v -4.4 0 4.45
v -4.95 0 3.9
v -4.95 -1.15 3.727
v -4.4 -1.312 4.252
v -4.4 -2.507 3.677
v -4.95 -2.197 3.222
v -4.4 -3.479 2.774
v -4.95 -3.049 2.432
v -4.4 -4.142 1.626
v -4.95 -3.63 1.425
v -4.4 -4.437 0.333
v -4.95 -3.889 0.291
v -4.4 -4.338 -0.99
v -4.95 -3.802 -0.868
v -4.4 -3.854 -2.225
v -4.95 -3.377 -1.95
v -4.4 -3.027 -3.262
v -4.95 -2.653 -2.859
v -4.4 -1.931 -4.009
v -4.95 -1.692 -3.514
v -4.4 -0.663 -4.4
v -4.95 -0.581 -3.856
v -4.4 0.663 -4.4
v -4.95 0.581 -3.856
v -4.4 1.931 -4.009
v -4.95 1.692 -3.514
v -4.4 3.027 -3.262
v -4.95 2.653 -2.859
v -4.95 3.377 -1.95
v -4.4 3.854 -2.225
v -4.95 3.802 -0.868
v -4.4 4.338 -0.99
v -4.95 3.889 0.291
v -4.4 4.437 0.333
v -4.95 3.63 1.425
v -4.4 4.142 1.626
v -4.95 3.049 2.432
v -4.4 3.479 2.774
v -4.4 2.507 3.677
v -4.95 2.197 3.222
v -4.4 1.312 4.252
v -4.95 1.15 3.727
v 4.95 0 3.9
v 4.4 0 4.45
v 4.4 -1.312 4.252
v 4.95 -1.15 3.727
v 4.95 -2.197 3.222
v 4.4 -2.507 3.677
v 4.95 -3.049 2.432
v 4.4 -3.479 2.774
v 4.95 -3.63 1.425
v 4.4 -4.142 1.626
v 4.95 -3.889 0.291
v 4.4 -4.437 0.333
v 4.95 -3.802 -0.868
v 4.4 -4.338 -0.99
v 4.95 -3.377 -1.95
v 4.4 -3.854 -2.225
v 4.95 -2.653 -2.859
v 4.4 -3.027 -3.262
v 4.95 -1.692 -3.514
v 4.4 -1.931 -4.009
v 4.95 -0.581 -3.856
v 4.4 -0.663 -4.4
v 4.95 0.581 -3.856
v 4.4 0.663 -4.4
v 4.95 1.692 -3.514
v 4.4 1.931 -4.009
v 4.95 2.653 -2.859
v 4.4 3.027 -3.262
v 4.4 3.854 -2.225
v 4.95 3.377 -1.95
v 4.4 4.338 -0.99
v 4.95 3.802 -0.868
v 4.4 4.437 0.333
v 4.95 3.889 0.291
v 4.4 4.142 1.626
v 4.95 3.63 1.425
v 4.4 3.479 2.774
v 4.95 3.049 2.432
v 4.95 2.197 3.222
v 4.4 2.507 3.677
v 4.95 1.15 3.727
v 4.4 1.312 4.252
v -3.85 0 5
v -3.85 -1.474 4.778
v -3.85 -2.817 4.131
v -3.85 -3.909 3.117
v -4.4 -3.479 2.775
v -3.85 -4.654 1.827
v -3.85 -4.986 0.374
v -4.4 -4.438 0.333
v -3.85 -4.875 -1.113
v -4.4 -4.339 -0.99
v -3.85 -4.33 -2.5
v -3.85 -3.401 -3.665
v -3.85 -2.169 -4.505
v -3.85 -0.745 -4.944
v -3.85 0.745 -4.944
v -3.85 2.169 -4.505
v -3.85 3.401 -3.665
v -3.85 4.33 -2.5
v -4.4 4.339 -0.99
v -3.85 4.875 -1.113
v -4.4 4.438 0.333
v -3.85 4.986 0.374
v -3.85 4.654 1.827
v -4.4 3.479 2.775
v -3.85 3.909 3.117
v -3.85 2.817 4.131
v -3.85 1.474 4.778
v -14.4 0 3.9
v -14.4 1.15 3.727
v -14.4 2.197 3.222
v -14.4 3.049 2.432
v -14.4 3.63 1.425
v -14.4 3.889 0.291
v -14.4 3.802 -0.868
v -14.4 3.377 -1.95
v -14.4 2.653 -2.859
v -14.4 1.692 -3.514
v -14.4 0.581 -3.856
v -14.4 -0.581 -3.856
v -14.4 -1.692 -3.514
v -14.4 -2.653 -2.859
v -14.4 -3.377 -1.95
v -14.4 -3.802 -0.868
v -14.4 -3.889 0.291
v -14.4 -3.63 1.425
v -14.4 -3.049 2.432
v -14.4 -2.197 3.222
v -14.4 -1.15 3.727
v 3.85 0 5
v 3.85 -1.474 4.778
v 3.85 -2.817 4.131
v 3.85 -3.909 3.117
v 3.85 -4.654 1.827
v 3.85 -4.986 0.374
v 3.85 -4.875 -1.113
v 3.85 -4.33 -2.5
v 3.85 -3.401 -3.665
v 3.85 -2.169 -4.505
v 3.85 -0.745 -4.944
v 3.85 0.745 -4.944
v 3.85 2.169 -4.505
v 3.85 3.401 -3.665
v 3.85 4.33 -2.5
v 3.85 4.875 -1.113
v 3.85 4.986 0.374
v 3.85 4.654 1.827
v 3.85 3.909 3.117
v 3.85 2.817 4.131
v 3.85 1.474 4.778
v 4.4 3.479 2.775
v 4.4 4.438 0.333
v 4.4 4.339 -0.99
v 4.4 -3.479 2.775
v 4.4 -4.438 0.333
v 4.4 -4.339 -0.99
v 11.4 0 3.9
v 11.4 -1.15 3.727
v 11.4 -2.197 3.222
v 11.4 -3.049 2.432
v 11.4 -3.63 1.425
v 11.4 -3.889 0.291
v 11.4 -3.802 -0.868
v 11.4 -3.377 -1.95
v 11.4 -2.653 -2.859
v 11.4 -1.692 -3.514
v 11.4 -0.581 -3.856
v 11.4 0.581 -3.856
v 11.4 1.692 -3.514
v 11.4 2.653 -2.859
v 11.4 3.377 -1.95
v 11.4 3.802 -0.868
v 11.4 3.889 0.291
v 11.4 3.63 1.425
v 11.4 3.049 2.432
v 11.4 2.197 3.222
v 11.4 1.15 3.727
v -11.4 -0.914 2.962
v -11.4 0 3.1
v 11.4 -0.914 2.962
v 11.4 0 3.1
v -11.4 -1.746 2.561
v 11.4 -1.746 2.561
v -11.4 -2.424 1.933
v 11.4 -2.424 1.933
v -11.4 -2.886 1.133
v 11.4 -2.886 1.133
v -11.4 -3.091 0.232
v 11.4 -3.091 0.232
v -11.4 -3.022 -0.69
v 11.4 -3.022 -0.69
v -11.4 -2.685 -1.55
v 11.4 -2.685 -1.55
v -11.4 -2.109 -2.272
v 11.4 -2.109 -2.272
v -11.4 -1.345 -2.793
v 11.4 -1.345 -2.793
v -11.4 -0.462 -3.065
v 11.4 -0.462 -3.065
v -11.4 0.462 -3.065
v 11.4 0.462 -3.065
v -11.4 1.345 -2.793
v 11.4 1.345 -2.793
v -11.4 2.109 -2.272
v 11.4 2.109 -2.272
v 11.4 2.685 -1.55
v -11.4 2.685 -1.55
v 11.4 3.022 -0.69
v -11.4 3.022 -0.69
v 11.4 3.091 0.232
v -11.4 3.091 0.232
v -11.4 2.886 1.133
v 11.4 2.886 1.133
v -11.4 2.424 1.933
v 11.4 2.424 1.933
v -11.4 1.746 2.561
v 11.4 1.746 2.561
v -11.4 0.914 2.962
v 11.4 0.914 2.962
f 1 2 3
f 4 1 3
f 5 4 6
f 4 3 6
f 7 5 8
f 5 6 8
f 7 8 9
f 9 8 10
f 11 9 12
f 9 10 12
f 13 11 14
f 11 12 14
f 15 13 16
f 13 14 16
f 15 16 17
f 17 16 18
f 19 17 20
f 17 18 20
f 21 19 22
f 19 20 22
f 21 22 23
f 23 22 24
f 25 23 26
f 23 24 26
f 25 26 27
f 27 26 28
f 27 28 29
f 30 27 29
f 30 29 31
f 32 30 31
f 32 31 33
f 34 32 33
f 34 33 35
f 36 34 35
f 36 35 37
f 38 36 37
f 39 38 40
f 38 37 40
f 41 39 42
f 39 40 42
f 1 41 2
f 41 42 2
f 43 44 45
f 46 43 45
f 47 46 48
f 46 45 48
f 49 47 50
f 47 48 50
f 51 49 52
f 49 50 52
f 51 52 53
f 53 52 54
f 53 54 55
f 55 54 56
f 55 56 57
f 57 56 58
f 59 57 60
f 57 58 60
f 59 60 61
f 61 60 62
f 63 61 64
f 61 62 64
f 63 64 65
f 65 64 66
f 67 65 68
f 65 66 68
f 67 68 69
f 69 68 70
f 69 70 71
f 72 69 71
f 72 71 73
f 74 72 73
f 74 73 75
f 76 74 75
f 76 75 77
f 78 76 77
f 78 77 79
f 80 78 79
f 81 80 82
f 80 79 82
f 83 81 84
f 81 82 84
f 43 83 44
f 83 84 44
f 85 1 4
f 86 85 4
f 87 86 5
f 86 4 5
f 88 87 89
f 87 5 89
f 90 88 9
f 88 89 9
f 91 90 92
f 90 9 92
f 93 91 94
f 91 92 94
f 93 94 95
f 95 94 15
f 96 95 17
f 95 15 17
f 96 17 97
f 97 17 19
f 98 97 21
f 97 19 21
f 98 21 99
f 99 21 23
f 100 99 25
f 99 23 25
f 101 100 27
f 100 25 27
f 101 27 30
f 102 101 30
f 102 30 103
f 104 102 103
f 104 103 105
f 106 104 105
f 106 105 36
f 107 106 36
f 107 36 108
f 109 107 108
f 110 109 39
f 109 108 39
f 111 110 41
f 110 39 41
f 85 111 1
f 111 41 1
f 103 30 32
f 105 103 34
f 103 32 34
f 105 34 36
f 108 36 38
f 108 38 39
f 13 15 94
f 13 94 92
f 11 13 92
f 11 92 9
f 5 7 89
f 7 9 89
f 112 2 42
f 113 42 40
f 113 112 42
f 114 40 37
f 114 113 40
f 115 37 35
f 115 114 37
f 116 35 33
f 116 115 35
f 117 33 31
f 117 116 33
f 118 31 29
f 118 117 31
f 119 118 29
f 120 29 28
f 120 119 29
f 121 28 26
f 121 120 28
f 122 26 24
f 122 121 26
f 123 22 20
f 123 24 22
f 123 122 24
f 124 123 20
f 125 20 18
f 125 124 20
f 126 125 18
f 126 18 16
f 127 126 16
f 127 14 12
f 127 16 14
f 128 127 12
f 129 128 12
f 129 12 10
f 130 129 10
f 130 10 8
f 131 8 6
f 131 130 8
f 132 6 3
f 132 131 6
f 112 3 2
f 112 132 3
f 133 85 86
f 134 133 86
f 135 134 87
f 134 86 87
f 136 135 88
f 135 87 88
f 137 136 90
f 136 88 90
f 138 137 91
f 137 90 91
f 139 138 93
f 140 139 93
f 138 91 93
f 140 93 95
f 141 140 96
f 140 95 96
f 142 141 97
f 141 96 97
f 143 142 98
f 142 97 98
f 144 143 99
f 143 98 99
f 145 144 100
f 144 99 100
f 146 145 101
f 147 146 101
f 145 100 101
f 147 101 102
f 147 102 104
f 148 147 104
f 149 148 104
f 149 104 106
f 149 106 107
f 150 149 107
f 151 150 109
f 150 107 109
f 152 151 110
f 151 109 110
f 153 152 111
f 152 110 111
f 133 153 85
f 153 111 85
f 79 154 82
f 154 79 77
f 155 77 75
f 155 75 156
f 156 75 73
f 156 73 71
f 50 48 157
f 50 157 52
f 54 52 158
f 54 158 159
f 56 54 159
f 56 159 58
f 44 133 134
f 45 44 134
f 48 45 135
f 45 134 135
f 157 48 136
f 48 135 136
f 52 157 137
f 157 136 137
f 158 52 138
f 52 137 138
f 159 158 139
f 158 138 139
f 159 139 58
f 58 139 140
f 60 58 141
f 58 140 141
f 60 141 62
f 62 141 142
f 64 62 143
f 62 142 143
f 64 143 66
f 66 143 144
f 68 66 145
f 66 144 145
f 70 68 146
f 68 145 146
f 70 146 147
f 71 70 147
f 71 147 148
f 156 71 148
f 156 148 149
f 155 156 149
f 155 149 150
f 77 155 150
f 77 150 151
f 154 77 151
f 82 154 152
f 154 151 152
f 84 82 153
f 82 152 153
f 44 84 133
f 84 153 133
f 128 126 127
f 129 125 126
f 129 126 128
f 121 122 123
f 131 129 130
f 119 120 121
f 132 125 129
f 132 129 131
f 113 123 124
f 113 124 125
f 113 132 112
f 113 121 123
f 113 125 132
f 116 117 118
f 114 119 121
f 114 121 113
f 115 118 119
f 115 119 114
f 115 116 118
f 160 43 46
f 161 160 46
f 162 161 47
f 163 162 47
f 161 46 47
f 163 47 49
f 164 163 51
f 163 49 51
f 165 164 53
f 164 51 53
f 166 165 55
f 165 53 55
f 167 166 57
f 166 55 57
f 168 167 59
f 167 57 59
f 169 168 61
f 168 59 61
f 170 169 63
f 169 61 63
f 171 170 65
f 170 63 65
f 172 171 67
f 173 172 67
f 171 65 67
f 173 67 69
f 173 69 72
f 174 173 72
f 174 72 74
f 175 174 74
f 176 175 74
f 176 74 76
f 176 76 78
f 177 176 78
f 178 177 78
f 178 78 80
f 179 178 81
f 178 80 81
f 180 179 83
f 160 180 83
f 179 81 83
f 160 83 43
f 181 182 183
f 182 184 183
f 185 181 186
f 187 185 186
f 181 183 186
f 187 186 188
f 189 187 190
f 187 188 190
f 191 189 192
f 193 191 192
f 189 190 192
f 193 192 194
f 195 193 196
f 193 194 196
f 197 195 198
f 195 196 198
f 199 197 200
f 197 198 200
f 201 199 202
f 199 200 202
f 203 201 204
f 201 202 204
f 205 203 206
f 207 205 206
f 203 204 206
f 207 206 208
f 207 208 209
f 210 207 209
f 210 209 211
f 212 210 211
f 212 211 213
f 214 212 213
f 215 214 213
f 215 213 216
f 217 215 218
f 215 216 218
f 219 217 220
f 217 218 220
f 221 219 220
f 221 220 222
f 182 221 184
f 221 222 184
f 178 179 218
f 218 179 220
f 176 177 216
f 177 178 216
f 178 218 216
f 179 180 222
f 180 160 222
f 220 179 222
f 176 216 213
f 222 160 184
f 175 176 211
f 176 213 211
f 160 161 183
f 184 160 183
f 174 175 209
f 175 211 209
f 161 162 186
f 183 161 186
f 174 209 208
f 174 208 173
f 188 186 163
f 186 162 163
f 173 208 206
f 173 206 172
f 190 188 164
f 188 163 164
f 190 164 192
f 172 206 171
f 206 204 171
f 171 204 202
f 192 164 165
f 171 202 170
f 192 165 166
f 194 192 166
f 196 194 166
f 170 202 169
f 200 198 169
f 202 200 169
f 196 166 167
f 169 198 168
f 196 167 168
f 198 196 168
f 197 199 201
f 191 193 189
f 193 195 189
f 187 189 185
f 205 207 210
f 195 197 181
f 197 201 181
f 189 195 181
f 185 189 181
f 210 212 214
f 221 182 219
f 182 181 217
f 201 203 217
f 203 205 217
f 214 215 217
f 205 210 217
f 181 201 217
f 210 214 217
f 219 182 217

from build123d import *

# Parameters (mm, degrees)
CHAMFER8_SIZE       = 0.55
BOSS_EXTRUDE3_START = 3
SKETCH8_R           = 3.9
BOSS_EXTRUDE3_DEPTH = 3


with BuildPart() as part:
    # Sketch1 → Revolve1 (revolve)
    with BuildSketch(Plane(origin=(0, 0, 0), x_dir=(1, 0, 0), z_dir=(0, 1, 0)), mode=Mode.PRIVATE) as revolve1_sk:
        Polygon((-11.4, 3.1), (11.4, 3.1), (11.4, 3.9), (4.4, 3.9), (4.4, 5), (-4.4, 5), (-4.4, 3.9), (-11.4, 3.9), align=None)
    revolve(revolve1_sk.sketch.rotate(Axis((-11.4, 0, 0), (1, 0, 0)), 180), axis=Axis((-11.4, 0, 0), (1, 0, 0)))

    # Chamfer8
    chamfer8_edges = [part.edges().sort_by_distance(p)[0] for p in [
        (4.4, 0, -3.9),
        (4.4, 0, -5),
        (-4.4, 0, -5),
        (-4.4, 0, -3.9),
    ]]
    chamfer(chamfer8_edges, length=CHAMFER8_SIZE - 0.0001)  # a hair under: the kernel refuses the full size

    # Sketch8 → Boss-Extrude3 (add)
    with BuildSketch(Plane.ZY.offset(11.4).offset(BOSS_EXTRUDE3_START)):
        Circle(SKETCH8_R)
    extrude(amount=-BOSS_EXTRUDE3_DEPTH)


solid = part.part
